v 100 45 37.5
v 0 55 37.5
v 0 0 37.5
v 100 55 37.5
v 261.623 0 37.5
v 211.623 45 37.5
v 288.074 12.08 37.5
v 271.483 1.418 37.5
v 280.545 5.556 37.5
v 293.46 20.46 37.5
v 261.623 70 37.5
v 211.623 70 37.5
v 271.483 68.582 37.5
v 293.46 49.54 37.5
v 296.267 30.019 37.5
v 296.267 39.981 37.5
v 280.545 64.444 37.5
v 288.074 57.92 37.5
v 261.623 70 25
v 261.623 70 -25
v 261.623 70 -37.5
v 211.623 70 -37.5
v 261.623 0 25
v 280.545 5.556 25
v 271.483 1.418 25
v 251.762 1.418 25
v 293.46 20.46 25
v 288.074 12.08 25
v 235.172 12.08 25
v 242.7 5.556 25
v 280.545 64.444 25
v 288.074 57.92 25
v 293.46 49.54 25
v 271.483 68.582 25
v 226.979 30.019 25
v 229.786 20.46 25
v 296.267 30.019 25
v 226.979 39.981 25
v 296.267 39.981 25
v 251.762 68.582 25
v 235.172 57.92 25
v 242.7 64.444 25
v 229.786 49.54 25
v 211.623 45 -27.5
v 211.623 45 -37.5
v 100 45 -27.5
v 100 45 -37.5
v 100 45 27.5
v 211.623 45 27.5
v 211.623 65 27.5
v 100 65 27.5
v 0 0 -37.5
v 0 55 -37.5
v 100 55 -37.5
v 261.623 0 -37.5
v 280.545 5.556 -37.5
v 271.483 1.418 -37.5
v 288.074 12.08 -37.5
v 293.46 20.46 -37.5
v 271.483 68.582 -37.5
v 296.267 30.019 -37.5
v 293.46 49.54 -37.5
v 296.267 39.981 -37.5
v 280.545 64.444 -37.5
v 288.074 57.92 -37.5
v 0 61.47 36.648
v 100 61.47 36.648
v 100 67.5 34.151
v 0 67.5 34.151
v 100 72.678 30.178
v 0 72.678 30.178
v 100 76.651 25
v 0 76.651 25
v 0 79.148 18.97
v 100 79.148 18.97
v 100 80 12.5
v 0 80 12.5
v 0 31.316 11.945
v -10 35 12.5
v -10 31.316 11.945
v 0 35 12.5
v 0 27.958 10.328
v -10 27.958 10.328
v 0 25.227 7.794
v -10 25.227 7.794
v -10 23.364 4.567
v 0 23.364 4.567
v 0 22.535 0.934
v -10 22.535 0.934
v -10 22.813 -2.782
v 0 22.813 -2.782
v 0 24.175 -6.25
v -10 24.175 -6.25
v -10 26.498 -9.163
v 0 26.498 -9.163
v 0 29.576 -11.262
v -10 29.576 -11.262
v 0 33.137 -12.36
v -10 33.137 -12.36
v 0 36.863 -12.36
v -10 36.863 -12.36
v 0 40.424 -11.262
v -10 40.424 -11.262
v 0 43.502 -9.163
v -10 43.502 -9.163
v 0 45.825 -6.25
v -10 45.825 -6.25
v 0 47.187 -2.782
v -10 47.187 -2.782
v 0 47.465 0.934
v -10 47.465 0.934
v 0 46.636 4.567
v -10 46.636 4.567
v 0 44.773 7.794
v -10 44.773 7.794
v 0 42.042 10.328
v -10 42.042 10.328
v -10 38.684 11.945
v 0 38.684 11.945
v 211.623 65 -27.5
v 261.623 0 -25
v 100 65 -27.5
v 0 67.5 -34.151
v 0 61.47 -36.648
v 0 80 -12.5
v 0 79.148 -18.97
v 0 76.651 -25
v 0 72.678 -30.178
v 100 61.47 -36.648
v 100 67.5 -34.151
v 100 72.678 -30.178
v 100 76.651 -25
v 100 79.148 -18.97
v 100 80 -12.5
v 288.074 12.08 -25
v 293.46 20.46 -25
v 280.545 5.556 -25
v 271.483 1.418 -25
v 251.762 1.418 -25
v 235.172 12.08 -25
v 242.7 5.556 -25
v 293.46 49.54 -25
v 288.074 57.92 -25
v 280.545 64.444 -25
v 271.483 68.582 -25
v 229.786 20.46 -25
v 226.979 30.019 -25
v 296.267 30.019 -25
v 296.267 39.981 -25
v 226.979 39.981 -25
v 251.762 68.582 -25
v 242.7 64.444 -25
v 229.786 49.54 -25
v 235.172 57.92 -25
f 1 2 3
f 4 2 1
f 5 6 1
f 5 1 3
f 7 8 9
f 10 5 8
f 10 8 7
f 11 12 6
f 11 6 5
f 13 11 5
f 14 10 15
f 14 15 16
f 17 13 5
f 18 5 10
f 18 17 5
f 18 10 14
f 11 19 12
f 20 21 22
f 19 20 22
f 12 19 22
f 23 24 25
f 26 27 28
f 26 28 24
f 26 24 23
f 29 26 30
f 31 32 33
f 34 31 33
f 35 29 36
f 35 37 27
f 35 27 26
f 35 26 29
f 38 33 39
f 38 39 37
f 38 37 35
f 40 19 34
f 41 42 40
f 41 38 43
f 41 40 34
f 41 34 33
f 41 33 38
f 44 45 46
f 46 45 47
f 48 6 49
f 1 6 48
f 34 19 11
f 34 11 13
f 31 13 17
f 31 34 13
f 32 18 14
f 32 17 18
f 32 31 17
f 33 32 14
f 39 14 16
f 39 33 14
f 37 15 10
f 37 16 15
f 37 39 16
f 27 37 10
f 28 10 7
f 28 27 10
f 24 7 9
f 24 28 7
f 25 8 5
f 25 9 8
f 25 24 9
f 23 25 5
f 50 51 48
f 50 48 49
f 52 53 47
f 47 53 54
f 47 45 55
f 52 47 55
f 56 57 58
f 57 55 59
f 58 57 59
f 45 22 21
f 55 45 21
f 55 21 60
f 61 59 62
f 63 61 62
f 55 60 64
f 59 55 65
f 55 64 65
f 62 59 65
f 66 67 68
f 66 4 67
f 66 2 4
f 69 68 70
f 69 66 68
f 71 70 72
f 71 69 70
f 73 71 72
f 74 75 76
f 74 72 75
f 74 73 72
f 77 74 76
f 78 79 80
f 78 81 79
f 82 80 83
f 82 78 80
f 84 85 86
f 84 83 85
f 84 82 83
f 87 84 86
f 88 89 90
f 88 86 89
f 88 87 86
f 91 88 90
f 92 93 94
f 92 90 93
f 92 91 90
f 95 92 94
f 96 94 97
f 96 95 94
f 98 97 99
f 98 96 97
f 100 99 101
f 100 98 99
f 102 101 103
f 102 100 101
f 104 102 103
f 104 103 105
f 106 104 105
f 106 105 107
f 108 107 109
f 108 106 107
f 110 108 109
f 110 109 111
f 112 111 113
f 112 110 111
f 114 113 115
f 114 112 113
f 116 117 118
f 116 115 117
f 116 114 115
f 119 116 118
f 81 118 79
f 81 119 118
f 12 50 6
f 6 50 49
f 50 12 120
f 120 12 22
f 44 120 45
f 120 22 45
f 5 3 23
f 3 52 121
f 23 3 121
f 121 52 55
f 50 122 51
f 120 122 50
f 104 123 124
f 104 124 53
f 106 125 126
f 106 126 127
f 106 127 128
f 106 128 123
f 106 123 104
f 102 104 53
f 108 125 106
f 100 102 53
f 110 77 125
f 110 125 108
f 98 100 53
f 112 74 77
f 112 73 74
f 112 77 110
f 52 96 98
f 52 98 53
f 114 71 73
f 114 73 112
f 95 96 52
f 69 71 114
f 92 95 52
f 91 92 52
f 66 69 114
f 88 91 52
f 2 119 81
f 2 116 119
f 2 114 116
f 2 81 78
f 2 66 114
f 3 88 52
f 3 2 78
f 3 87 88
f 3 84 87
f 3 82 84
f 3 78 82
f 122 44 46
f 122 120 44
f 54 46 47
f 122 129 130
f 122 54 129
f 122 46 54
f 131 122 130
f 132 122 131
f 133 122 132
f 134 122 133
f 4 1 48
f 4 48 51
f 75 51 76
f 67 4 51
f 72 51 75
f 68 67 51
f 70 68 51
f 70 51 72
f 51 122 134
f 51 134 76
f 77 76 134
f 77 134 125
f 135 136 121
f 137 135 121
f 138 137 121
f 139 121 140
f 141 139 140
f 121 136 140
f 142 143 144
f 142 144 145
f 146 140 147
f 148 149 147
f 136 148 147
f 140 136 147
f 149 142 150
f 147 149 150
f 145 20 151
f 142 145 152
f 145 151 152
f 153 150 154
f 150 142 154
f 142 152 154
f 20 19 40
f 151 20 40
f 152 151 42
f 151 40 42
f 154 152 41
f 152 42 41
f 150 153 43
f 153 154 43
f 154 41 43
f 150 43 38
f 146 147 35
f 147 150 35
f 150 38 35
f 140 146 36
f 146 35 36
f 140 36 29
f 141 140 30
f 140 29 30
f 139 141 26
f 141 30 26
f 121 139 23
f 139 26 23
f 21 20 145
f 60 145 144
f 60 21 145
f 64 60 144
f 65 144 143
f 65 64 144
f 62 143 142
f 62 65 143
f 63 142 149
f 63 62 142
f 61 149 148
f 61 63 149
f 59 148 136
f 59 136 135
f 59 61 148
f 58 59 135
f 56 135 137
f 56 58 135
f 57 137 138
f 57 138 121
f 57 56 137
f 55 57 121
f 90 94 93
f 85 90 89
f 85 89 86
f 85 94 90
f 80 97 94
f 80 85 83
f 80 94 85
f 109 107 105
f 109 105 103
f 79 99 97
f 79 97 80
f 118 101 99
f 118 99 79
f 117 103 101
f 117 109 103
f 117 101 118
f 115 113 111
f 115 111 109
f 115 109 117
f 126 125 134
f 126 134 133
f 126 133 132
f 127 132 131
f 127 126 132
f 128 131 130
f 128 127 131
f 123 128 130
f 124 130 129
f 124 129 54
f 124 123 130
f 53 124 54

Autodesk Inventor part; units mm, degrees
ref_plane "YZ Plane" through (0, 0, 0) normal (1, 0, 0) x (0, 1, 0)
ref_plane "XZ Plane" through (0, 0, 0) normal (0, 1, 0) x (-1, 0, 0)
sketch "Sketch1" plane through (0, 0, 0) normal (0, 0, 1) x (1, 0, 0)
  line L0 (0, 0) -> (0, 37.8188) construction
  line L1 (0, 0) -> (95.7615, 0) construction
  line L2 (0, 0) -> (261.6228, 0)
  line L3 (0, 0) -> (0, 70)
  arc A0 (261.6228, 0) -> (261.6228, 70) centre (261.6228, 35) ccw
  line L4 (261.6228, 70) -> (0, 70)
  dimension "d10" = 35
extrude "Extrusion1" add sketch "Sketch1" along normal mid plane 75
sketch "Sketch2" plane through (0, 0, 37.5) normal (-1, 0, 0) x (0, 0, 1)
  circle A0 centre (-37.5, 35) radius 12.5
  line L0 (0, 70) -> (0, 0) projected
  line L1 (0, 0) -> (-75, 0) projected
  point P0 (-37.5, 0)
  point P1 (-37.5, 0)
  dimension "d12" = 25
  dimension "d13" = 35
extrude "Extrusion2" add sketch "Sketch2" along normal blind 10
ref_plane "Work Plane1" through (0, 0, 0) normal (0, 0, -1) x (-1, 0, 0)
sketch "Sketch3" plane through (0, 0, 0) normal (0, 0, -1) x (-1, 0, 0)
  circle A0 centre (-261.6228, 35) radius 35
  arc A1 (-261.6228, 70) -> (-261.6228, 0) centre (-261.6228, 35) ccw projected
  point P0 (0, 0)
  dimension "d18" = 70
extrude "Extrusion3" cut sketch "Sketch3" along normal mid plane 50
sketch "Sketch4" plane through (0, 0, 37.5) normal (0, 0, 1) x (1, 0, 0)
  line L0 (0, 70) -> (0, 0) projected
  line L1 (0, 70) -> (100, 70)
  line L2 (100, 70) -> (100, 80)
  line L3 (100, 80) -> (0, 80)
  line L4 (0, 80) -> (0, 70)
  dimension "d21" = 100
  dimension "d22" = 10
extrude "Extrusion4" add sketch "Sketch4" against normal blind 75
sketch "Sketch5" plane through (0, 0, 37.5) normal (0, 0, 1) x (1, 0, 0)
  line L0 (261.6228, 70) -> (100, 70) projected
  line L1 (100, 70) -> (211.6228, 70)
  line L2 (211.6228, 70) -> (211.6228, 45)
  line L3 (211.6228, 45) -> (100, 45)
  line L4 (100, 45) -> (100, 70)
  point P0 (0, 0)
  dimension "d25" = 25
  dimension "d28" = 50
extrude "Extrusion5" cut sketch "Sketch5" against normal blind 10
sketch "Sketch6" plane through (0, 0, -37.5) normal (0, 0, -1) x (-1, 0, 0)
  line L0 (-100, 70) -> (-261.6228, 70) projected
  line L1 (-211.6228, 45) -> (-100, 45) projected
  line L2 (-100, 70) -> (-211.6228, 70)
  line L3 (-211.6228, 70) -> (-211.6228, 45)
  line L4 (-211.6228, 45) -> (-100, 45)
  line L5 (-100, 45) -> (-100, 70)
  point P0 (0, 0)
extrude "Extrusion6" cut sketch "Sketch6" against normal blind 10
sketch "Sketch7" plane through (261.6228, 70, 25) normal (0, 1, 0) x (1, 0, 0)
  line L0 (-161.6228, -12.5) -> (-161.6228, 62.5) projected
  line L1 (-50, 52.5) -> (-161.6228, 52.5) projected
  line L2 (-161.6228, -2.5647) -> (-50, -2.5647)
  line L3 (-50, -2.5647) -> (-50, 52.5)
  line L4 (-50, 52.5) -> (-161.6228, 52.5)
  line L5 (-161.6228, 52.5) -> (-161.6228, -2.5647)
  point P0 (-261.6228, 25)
extrude "Extrusion7" cut sketch "Sketch7" against normal blind 5
fillet "Fillet1" radius 25 2 edges at (50, 80, 37.5) (50, 80, -37.5)
properties material "ABS Plastic"
